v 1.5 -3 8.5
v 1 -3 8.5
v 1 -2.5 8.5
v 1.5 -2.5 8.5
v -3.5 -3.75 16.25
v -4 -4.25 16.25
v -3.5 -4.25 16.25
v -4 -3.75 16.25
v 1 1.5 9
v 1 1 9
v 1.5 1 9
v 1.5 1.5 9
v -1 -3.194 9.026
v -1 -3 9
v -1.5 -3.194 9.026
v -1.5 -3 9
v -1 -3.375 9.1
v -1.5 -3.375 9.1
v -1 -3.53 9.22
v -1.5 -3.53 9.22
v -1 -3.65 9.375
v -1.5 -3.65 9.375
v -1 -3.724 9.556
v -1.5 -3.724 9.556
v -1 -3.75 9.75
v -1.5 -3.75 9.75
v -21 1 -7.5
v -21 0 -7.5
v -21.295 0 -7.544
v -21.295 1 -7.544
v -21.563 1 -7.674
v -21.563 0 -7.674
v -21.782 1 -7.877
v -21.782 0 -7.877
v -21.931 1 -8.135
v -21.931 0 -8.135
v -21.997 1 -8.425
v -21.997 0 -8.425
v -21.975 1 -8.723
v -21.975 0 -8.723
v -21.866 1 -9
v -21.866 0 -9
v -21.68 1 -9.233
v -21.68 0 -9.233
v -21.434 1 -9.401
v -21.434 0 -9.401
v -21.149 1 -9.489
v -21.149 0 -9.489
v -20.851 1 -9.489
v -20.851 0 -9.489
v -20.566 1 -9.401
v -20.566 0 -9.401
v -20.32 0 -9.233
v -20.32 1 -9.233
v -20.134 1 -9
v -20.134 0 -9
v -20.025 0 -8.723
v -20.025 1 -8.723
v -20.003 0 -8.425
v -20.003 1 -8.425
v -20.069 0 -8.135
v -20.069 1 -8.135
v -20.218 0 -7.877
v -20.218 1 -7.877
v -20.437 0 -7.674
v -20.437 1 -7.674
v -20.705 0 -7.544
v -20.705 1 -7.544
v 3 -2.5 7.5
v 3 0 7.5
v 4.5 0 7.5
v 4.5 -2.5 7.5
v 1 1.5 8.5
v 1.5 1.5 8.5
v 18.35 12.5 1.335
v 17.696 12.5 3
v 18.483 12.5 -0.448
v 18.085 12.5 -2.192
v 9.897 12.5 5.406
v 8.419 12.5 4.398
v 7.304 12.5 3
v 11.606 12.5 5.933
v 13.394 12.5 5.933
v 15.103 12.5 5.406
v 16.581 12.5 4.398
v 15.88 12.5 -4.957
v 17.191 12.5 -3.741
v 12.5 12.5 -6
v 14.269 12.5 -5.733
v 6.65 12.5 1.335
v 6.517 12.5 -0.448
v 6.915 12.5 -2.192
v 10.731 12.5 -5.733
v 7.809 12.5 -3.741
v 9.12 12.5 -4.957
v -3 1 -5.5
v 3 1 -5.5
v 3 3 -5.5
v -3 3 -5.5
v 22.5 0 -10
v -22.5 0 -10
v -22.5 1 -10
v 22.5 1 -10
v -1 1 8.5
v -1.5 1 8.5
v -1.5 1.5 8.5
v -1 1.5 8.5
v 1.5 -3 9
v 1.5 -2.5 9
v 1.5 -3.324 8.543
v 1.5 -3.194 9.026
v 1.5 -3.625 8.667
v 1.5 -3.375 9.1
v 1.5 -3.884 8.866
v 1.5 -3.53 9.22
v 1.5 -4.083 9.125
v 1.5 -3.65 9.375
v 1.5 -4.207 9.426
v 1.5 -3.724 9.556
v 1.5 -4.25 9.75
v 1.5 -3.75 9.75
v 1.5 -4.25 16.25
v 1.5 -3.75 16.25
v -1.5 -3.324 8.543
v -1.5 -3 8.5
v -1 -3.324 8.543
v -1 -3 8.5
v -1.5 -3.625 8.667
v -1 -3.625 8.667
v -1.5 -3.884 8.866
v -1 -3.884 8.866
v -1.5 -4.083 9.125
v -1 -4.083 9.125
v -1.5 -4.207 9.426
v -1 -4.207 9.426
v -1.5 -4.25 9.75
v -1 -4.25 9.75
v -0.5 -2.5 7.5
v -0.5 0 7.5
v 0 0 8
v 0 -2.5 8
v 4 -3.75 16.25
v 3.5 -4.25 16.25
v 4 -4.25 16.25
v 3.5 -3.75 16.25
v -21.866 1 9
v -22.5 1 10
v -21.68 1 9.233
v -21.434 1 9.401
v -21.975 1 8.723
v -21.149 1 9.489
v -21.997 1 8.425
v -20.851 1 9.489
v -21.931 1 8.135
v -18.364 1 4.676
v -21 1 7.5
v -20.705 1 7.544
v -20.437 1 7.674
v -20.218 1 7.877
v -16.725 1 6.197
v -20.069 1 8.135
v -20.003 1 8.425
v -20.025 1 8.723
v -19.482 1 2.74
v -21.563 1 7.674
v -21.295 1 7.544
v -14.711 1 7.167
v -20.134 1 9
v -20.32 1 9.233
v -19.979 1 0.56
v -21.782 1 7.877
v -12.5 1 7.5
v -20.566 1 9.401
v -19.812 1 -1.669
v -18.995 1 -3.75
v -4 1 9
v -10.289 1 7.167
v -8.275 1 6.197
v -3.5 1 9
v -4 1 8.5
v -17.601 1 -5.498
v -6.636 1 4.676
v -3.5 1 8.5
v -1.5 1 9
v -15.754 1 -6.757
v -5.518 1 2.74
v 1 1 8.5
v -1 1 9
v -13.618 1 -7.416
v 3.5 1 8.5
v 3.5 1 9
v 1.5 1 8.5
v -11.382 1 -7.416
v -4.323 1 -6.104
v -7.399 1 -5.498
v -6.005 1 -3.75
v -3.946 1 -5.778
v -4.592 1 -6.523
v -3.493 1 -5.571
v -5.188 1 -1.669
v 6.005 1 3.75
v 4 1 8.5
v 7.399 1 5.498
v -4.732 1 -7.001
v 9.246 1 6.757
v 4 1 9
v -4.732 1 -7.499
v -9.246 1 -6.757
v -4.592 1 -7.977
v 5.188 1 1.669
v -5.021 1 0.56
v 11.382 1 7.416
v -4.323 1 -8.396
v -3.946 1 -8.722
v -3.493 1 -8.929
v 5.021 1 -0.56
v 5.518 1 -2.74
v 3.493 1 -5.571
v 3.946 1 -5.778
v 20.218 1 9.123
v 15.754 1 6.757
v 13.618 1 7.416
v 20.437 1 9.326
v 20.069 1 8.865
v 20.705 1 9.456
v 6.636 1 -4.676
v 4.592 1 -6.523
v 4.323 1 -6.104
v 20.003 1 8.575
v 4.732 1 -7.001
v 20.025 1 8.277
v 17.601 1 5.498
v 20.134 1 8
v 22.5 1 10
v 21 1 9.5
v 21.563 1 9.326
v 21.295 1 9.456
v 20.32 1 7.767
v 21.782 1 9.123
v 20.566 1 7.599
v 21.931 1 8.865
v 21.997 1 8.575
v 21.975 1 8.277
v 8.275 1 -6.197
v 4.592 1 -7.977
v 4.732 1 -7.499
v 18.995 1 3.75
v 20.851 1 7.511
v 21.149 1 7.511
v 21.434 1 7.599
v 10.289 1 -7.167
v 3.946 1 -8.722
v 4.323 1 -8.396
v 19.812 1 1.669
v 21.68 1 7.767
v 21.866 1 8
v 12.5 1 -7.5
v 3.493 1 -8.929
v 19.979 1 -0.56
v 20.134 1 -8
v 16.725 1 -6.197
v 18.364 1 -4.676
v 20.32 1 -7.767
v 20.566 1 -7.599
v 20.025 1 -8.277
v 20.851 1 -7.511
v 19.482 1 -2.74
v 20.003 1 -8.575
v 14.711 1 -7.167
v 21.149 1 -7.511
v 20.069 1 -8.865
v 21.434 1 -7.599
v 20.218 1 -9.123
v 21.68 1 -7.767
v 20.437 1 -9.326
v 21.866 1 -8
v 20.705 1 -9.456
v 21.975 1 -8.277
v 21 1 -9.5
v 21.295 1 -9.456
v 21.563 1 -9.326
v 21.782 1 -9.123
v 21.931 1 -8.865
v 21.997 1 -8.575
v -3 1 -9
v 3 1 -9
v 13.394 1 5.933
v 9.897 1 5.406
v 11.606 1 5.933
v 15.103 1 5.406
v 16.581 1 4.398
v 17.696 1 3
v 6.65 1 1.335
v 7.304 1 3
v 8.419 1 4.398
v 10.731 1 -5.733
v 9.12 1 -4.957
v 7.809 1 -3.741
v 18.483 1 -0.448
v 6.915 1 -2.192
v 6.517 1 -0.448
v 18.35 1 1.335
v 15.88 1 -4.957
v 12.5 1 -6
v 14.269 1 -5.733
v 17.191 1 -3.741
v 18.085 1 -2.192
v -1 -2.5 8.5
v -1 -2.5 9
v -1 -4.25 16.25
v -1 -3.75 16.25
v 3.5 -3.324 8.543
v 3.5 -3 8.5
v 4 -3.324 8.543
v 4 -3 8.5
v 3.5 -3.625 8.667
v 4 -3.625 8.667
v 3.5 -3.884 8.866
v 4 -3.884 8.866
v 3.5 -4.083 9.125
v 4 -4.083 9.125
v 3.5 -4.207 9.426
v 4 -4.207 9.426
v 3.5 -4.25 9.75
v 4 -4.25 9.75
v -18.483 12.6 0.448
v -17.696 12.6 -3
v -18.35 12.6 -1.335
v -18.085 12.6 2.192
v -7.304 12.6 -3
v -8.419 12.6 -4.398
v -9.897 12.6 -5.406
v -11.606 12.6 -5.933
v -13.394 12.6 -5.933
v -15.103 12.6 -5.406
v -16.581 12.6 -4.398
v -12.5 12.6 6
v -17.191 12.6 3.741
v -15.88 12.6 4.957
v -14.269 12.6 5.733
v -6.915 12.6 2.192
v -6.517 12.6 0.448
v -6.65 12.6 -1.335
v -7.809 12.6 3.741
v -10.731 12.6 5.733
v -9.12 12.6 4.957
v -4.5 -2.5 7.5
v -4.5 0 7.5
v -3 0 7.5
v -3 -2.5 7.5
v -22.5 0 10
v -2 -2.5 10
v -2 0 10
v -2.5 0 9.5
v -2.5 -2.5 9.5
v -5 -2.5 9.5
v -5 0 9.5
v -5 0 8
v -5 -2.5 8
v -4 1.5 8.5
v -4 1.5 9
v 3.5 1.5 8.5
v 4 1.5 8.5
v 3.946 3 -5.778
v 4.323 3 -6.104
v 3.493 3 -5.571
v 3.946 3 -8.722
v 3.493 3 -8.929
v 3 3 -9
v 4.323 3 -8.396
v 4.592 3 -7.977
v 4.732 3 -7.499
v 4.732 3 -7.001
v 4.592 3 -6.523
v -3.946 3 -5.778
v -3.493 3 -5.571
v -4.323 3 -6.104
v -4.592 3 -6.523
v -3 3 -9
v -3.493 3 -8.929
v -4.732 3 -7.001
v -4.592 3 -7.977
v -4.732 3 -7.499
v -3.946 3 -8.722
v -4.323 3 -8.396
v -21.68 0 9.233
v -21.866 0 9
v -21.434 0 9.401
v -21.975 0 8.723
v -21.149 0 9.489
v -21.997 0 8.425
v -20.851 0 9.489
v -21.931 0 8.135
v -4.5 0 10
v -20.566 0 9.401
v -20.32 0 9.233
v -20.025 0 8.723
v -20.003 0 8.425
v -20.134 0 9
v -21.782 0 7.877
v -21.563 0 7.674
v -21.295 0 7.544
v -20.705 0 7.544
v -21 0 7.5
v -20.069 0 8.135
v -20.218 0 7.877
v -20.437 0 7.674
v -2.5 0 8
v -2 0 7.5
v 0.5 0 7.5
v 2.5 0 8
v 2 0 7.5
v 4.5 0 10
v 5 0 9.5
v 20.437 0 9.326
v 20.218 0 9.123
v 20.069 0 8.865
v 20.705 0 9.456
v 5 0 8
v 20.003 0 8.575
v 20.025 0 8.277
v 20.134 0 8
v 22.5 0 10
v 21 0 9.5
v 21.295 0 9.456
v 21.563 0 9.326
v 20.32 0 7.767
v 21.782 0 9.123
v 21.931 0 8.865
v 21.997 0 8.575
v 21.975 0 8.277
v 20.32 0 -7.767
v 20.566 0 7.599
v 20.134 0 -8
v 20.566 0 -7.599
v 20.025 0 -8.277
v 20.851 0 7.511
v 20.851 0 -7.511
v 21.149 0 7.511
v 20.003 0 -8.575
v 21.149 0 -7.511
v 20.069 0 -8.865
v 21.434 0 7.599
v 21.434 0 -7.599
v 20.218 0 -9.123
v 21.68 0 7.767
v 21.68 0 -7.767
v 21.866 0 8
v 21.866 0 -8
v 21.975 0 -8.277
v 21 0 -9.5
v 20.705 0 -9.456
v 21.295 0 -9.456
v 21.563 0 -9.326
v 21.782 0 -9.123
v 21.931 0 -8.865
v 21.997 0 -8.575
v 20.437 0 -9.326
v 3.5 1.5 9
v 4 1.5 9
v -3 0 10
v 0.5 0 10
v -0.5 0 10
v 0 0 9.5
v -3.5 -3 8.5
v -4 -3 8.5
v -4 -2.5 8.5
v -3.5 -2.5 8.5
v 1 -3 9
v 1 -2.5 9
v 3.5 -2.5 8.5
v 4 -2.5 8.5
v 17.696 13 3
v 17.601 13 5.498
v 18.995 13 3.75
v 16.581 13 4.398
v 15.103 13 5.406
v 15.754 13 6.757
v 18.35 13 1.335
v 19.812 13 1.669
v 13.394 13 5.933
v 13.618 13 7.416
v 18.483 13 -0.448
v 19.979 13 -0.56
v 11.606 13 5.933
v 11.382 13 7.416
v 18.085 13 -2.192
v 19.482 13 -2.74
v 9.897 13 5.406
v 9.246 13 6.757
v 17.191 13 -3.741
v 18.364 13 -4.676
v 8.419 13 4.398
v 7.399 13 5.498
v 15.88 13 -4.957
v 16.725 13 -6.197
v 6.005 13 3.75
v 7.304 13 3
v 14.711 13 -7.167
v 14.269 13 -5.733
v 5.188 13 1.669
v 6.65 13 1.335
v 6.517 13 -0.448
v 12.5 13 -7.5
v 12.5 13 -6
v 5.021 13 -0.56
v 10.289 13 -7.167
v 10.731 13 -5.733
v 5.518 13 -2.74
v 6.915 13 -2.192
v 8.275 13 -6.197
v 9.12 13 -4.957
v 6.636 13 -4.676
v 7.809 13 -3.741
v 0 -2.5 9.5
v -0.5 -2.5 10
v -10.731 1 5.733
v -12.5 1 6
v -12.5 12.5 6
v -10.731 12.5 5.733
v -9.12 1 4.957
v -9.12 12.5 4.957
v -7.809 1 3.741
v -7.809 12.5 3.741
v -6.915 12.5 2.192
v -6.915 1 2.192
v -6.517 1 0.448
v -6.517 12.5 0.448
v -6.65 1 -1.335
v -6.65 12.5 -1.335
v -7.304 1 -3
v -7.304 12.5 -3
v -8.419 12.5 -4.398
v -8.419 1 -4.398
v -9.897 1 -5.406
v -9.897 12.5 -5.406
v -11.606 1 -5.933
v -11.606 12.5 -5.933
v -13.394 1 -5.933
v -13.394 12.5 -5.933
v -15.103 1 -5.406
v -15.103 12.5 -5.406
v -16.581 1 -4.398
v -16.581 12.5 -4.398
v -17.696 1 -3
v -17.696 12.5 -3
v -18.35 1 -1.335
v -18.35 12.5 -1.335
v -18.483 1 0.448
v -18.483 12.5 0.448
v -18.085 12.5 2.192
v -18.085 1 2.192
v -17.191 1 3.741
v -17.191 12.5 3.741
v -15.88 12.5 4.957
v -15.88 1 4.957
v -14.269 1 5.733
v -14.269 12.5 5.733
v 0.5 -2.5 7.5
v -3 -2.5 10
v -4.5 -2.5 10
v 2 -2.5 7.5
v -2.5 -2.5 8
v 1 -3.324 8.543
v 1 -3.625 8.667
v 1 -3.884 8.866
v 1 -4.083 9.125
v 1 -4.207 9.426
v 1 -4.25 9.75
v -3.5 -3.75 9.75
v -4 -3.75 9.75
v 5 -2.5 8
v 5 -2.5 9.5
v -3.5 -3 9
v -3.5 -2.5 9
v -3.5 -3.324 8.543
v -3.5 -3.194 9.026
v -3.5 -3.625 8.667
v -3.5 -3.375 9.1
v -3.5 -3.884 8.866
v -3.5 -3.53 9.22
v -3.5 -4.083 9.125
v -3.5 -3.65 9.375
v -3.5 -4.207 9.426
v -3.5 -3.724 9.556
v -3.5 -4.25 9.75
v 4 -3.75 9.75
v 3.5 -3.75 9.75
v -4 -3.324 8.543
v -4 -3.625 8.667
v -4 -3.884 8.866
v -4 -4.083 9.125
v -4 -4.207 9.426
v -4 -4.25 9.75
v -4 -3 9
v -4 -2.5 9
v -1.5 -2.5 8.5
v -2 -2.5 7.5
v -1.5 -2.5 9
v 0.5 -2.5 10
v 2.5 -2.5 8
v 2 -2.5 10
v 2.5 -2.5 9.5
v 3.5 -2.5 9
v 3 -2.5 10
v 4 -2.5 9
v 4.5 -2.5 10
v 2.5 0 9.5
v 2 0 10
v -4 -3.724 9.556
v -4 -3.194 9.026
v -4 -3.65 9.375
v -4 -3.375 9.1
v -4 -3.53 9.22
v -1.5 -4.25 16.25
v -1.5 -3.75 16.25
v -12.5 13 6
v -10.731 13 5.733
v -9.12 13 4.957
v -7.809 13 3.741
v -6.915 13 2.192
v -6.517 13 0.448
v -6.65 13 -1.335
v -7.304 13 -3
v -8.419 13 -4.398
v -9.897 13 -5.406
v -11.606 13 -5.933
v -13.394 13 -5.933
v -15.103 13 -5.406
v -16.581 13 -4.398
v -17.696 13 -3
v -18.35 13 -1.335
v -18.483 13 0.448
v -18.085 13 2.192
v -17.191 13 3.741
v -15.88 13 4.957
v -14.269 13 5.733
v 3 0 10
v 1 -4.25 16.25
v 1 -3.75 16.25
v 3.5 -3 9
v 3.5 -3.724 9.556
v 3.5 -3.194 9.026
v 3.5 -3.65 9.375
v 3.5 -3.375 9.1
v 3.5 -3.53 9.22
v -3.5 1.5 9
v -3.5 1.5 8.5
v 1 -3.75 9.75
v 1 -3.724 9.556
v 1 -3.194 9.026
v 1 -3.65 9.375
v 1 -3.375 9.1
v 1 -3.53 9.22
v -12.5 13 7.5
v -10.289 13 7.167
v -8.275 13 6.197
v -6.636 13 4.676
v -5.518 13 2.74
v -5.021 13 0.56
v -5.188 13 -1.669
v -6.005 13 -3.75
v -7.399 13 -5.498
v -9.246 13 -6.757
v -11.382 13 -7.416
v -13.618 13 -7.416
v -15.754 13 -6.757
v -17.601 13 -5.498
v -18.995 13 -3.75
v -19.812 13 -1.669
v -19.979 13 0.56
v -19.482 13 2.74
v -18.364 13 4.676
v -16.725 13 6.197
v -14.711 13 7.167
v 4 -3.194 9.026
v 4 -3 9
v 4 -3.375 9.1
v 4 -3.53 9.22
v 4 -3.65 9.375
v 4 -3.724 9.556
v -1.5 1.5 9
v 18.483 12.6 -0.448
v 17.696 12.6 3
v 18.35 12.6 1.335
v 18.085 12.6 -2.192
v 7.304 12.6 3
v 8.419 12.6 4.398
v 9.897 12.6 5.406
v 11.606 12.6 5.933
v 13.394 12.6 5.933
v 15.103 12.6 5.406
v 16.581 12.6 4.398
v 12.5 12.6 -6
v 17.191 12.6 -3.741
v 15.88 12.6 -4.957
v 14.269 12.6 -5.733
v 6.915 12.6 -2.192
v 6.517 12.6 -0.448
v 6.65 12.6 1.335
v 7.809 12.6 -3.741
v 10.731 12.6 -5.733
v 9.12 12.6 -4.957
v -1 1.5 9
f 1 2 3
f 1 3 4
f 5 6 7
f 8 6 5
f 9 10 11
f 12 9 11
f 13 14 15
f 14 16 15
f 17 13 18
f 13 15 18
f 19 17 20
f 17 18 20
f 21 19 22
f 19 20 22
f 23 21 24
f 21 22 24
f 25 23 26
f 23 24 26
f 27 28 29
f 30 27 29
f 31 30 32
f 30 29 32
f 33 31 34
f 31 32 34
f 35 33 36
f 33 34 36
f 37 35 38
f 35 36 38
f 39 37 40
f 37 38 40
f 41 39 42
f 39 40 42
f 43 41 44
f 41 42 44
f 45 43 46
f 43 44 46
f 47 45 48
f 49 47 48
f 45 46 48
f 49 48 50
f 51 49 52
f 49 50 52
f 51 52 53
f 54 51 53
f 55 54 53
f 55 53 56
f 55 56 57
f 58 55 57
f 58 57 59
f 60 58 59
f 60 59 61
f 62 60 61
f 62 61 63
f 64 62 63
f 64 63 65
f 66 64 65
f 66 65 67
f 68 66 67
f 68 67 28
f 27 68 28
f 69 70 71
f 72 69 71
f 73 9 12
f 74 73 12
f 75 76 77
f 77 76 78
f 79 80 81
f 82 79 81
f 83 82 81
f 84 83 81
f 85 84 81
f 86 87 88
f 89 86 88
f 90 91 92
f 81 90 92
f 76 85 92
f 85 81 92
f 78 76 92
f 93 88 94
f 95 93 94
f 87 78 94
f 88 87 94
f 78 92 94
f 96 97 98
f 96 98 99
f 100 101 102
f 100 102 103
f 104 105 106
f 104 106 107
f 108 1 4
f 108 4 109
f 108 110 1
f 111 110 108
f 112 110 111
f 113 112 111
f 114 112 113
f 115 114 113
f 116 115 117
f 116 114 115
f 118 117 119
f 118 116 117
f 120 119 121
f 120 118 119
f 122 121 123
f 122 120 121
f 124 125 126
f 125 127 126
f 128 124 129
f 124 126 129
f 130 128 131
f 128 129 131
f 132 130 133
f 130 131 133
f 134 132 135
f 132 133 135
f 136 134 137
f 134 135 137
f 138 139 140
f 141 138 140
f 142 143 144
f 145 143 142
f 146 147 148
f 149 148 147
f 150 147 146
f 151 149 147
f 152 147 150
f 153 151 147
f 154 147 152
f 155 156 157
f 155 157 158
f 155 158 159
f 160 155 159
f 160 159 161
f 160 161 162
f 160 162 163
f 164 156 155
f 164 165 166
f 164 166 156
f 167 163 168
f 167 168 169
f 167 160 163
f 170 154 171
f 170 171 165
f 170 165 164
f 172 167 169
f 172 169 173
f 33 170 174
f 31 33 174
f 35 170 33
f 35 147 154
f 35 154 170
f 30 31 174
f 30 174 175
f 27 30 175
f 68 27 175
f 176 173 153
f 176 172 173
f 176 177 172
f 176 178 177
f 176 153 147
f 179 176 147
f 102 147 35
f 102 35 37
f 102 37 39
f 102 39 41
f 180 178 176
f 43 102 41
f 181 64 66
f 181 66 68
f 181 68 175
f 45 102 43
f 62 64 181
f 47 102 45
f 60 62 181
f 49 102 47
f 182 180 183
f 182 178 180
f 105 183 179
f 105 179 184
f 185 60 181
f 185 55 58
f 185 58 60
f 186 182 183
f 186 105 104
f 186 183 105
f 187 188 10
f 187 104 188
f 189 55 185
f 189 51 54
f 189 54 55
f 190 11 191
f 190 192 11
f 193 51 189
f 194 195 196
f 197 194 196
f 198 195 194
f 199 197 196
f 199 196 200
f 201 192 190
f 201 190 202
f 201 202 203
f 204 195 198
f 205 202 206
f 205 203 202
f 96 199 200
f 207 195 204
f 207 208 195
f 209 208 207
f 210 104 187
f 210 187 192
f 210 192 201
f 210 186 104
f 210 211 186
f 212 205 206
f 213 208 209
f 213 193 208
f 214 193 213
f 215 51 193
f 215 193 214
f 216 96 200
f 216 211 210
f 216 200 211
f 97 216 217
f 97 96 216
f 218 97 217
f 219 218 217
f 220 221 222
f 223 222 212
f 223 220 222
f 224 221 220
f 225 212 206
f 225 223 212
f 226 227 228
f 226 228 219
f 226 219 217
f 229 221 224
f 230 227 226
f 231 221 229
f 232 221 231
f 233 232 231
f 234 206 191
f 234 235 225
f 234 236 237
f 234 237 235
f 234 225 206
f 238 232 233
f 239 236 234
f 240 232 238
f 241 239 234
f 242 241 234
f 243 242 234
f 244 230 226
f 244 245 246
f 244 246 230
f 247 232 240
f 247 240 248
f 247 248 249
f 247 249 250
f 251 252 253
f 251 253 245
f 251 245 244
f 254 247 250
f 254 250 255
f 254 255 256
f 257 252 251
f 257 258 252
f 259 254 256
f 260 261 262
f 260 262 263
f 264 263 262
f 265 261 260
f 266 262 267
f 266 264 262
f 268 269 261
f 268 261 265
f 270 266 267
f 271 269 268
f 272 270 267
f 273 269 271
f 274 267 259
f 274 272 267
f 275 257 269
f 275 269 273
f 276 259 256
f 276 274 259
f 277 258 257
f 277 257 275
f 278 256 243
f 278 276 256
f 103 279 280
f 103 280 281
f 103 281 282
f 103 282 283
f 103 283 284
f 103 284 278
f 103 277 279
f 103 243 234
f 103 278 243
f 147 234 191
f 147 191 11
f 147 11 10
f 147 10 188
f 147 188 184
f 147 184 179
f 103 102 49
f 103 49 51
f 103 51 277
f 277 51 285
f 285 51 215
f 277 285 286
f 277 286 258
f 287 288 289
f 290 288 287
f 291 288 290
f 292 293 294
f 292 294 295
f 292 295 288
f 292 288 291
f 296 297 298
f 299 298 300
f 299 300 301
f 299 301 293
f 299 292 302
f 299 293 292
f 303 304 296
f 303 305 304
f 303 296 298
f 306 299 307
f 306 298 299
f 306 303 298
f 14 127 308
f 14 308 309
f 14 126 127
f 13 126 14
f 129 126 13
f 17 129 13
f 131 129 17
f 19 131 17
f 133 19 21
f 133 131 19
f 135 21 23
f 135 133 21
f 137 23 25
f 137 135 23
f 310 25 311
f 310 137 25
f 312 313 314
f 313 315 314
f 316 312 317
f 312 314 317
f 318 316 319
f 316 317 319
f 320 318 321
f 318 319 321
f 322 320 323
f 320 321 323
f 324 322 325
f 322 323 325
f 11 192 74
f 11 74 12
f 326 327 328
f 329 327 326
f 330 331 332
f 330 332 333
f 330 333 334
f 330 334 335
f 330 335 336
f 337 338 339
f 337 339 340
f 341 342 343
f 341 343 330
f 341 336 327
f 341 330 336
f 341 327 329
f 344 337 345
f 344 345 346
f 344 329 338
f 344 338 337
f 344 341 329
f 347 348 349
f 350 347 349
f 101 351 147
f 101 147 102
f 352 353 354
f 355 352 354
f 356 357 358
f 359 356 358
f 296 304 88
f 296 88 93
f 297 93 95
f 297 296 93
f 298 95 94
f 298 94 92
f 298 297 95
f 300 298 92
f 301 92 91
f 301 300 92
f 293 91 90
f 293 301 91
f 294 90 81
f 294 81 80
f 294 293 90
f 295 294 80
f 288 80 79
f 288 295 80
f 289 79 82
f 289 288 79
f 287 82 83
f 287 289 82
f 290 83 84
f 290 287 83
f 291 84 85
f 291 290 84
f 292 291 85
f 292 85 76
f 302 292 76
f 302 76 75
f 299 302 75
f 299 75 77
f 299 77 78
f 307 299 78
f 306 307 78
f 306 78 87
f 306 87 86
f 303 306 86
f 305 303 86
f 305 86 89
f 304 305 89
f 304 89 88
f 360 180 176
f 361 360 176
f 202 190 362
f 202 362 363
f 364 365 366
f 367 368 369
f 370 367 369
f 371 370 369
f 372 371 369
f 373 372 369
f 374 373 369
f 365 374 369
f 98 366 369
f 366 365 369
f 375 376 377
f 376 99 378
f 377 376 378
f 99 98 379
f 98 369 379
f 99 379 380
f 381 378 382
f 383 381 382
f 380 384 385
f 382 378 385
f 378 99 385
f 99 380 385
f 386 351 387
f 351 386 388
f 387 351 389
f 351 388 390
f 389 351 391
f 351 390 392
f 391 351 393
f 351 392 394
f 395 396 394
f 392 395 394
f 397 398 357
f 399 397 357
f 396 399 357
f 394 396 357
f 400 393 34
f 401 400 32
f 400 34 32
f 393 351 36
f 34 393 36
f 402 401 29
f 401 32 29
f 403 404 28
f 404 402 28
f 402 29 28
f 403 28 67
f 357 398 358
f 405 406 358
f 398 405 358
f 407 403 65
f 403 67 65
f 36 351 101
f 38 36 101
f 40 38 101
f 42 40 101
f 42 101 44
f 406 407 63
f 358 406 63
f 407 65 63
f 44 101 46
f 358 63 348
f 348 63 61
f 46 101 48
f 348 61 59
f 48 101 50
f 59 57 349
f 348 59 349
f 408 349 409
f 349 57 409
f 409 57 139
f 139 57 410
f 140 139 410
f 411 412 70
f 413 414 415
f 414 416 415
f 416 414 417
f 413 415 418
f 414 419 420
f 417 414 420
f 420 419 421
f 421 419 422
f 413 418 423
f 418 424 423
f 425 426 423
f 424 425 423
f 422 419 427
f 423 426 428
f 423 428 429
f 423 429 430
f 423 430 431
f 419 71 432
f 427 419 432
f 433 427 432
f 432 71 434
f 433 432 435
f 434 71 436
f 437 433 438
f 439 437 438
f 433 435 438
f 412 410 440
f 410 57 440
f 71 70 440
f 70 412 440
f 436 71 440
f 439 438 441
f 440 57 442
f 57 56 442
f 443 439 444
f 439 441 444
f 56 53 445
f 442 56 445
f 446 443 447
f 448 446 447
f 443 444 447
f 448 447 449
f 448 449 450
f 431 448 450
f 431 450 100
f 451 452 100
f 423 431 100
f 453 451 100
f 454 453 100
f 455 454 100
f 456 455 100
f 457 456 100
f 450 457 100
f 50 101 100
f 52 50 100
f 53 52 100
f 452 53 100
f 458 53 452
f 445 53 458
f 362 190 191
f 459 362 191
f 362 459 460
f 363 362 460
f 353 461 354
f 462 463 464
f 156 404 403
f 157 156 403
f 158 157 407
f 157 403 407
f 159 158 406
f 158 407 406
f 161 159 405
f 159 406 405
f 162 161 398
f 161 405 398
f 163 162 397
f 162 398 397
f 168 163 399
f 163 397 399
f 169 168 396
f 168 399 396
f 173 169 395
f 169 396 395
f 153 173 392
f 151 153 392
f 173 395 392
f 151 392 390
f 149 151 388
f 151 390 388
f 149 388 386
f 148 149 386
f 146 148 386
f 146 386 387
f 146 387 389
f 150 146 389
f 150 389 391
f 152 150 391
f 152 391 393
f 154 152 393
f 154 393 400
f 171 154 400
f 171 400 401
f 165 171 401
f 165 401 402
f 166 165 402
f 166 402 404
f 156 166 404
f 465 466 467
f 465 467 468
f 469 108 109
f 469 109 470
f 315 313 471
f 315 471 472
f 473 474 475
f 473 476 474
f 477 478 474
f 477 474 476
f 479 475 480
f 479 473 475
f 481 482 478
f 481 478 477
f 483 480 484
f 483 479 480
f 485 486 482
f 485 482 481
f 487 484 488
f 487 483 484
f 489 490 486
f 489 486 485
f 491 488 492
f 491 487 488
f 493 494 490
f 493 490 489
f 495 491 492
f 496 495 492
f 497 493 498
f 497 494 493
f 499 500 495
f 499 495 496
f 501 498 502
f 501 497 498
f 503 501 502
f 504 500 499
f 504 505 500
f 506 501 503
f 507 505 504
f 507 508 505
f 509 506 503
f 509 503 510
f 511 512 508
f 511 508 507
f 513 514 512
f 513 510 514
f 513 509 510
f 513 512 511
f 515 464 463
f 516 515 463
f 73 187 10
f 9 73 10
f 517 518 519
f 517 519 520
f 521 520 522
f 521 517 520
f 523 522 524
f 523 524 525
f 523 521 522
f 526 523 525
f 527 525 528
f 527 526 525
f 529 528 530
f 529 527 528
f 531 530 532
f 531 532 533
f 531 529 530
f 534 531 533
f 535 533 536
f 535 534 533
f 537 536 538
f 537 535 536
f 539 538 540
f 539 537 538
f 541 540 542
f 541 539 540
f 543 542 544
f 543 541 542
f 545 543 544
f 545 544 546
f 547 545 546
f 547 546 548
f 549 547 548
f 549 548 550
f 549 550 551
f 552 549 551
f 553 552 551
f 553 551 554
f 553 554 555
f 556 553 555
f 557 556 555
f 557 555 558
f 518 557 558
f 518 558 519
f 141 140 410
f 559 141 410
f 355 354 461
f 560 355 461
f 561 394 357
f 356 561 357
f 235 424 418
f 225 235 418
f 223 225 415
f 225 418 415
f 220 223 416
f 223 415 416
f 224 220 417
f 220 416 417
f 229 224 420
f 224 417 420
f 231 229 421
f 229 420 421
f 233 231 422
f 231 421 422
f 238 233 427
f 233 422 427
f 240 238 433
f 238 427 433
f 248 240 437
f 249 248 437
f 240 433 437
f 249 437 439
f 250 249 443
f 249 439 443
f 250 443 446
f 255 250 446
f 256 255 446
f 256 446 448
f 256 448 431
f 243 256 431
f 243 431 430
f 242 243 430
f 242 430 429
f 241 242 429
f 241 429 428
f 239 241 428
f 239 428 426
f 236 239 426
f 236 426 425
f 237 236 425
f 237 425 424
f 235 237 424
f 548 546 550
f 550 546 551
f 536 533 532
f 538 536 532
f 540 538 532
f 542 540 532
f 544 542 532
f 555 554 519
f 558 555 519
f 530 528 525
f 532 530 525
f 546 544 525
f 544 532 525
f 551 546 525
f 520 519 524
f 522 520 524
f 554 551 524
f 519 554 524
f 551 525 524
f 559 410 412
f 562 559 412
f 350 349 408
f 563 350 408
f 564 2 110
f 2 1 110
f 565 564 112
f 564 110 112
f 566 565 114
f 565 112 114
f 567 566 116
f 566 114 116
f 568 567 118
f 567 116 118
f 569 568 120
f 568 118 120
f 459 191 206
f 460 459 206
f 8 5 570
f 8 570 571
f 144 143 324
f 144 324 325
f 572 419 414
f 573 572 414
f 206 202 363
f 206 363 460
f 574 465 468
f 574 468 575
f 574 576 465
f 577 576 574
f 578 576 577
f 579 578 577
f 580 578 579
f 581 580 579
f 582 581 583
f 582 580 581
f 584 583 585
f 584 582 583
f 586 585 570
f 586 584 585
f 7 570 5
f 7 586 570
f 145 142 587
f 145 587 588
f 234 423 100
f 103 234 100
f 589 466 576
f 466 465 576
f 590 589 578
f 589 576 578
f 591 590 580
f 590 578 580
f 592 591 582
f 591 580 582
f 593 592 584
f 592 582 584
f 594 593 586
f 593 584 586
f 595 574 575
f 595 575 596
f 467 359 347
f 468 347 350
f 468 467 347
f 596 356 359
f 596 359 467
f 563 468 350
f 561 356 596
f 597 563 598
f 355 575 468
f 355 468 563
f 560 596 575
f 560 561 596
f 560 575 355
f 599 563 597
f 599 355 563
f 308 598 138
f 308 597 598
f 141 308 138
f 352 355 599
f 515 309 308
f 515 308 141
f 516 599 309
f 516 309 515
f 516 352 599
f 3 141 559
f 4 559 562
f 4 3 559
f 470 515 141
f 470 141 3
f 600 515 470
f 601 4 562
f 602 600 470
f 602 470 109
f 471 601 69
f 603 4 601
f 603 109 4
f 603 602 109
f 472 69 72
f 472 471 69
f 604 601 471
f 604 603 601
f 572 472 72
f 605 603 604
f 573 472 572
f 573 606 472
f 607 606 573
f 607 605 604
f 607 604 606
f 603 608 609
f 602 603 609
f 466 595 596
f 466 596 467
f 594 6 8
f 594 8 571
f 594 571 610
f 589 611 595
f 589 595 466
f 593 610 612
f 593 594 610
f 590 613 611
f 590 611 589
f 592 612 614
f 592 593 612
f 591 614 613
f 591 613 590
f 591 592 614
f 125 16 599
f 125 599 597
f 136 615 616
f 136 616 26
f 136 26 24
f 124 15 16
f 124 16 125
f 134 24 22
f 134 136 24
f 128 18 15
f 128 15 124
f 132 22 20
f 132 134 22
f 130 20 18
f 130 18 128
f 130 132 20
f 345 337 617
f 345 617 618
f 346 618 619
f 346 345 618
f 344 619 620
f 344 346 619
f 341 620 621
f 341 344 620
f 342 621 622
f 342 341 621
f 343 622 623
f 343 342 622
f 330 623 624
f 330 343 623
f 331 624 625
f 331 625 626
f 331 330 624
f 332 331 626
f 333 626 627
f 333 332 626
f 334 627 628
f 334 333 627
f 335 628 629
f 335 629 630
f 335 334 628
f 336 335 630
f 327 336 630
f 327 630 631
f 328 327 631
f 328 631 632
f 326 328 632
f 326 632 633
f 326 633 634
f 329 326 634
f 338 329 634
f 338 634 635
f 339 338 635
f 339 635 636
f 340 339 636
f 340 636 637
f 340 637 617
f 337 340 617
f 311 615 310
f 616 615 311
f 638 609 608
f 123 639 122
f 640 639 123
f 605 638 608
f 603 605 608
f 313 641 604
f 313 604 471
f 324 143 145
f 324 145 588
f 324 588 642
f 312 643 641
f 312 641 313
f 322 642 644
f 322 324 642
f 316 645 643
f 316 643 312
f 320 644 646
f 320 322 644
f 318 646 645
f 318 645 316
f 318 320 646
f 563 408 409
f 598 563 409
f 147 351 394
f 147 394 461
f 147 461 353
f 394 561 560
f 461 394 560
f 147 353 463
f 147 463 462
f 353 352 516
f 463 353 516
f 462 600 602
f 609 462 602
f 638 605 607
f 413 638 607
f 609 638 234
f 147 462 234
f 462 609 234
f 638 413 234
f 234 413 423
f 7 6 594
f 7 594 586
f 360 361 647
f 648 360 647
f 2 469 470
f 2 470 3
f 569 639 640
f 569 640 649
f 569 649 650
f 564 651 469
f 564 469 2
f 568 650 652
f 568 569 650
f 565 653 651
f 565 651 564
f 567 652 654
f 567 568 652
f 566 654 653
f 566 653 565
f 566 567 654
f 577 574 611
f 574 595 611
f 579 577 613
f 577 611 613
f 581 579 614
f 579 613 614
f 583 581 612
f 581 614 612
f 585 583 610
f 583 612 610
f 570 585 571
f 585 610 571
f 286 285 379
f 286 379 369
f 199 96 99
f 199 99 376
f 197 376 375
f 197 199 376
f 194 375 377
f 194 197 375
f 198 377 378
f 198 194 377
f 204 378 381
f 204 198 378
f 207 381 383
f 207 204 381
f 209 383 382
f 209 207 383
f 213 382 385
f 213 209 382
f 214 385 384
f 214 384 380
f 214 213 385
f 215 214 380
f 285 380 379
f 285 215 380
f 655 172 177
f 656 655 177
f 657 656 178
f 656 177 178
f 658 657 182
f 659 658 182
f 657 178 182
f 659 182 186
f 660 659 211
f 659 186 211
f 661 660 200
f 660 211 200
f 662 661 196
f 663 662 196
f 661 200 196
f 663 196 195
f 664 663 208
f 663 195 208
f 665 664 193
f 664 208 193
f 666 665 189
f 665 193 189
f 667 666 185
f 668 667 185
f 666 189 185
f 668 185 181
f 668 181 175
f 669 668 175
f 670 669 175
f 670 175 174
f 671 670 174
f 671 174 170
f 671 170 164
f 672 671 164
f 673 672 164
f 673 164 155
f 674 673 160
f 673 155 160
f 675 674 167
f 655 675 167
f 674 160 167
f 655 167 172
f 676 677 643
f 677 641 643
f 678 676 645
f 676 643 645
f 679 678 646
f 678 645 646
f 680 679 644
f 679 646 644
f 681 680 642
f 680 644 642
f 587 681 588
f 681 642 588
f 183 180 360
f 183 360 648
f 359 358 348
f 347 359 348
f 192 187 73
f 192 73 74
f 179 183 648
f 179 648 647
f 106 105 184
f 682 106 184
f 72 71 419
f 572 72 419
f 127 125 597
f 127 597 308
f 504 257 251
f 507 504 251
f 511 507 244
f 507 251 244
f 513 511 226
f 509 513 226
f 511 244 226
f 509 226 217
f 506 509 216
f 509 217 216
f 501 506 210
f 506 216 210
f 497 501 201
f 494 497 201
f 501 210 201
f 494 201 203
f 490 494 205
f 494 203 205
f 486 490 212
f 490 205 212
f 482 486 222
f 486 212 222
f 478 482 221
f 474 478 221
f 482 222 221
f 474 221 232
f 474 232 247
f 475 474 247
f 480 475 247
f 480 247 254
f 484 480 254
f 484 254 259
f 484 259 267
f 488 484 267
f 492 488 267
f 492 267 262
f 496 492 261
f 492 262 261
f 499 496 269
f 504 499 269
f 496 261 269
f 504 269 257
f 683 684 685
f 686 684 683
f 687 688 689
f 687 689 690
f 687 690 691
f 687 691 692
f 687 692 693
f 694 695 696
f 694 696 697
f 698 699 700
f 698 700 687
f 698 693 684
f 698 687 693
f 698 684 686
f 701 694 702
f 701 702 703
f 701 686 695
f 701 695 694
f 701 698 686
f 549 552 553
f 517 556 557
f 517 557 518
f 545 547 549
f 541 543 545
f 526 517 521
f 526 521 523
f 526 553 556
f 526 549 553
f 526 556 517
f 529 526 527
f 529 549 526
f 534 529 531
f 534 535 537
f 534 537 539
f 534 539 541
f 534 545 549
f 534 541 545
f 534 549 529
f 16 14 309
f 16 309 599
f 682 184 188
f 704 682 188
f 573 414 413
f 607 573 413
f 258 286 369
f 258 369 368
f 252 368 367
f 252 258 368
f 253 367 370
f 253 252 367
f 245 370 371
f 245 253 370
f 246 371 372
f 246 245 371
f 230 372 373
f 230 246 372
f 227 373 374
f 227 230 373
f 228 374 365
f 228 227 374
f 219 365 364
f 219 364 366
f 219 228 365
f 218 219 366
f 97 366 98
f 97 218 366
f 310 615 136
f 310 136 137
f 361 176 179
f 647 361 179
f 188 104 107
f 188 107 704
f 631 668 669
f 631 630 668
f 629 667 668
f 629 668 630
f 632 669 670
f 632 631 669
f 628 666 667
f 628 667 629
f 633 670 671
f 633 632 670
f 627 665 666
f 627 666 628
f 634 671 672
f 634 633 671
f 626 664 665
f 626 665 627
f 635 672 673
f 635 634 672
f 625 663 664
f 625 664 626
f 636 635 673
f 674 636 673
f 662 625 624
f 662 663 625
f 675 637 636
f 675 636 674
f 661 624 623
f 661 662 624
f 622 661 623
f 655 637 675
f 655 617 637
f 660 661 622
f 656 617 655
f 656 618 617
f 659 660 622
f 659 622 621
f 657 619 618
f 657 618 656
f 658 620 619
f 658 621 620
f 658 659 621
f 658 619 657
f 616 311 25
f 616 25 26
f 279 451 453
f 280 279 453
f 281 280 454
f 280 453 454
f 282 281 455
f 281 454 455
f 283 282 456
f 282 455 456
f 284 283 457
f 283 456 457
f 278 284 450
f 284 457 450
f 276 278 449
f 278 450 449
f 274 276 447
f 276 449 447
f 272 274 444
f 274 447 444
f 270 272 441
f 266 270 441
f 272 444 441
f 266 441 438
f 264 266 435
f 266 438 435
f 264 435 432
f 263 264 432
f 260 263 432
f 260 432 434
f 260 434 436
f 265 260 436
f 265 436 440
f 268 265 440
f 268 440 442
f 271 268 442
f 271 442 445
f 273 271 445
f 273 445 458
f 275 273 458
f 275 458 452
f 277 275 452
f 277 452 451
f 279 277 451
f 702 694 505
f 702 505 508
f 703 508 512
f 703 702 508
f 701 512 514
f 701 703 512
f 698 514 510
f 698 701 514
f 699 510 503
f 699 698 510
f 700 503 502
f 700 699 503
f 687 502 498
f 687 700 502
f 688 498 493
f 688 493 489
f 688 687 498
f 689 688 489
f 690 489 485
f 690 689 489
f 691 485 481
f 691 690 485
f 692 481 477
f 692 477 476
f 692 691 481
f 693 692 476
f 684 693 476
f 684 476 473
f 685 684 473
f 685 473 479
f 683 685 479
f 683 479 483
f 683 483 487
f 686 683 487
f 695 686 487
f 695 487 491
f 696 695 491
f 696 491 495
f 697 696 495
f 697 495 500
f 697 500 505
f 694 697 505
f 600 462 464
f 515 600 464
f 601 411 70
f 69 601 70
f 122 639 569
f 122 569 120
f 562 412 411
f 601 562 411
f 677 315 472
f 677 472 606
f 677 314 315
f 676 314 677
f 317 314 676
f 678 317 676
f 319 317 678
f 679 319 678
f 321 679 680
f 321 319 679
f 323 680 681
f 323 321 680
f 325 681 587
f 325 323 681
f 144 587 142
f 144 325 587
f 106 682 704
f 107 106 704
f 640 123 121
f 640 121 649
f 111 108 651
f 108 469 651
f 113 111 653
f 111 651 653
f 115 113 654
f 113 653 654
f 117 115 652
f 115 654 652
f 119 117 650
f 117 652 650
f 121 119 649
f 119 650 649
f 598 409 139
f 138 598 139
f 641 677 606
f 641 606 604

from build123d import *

# Parameters (mm, degrees)
SKETCH1_W           = 45
SKETCH1_H           = 20
BOSS_EXTRUDE1_DEPTH = 1
SKETCH2_R           = 7.5
SKETCH2_R_2         = 6
BOSS_EXTRUDE2_DEPTH = 12
BOSS_EXTRUDE3_DEPTH = 2
BOSS_EXTRUDE4_START = -0.5
SKETCH4_R           = 6
BOSS_EXTRUDE4_DEPTH = 0.1
SKETCH9_W           = 0.5
SKETCH9_H           = 0.5
SKETCH9_2_W         = 0.5
SKETCH9_2_H         = 0.5
BOSS_EXTRUDE7_DEPTH = 1.5
LPATTERN5_COUNT     = 4
LPATTERN5_PITCH     = 2.5
BOSS_EXTRUDE6_DEPTH = 2.5
SKETCH12_R          = 1
CUT_EXTRUDE4_DEPTH  = 1.5


with BuildPart() as part:
    # Sketch1 → Boss-Extrude1 (new body)
    with BuildSketch(Plane(origin=(0, 0, 0), x_dir=(1, 0, 0), z_dir=(0, 1, 0))):
        Rectangle(SKETCH1_W, SKETCH1_H)
    extrude(amount=BOSS_EXTRUDE1_DEPTH)

    # Sketch2 → Boss-Extrude2 (add)
    # profile 1 of 2: a face of its own
    with BuildSketch(Plane(origin=(0, 1, 0), x_dir=(1, 0, 0), z_dir=(0, 1, 0))):
        with Locations(Location((-12.5, 0, 0), (0, 0, 270))):
            Circle(SKETCH2_R)
        with Locations(Location((-12.5, 0, 0), (0, 0, 270))):
            Circle(SKETCH2_R_2, mode=Mode.SUBTRACT)
    # profile 2 of 2: a face of its own
    with BuildSketch(Plane(origin=(0, 1, 0), x_dir=(1, 0, 0), z_dir=(0, 1, 0))):
        with Locations(Location((12.5, 0, 0), (0, 0, 90))):
            Circle(SKETCH2_R)
        with Locations(Location((12.5, 0, 0), (0, 0, 90))):
            Circle(SKETCH2_R_2, mode=Mode.SUBTRACT)
    extrude(amount=BOSS_EXTRUDE2_DEPTH)

    # Sketch3 → Boss-Extrude3 (add)
    with BuildSketch(Plane(origin=(0, 1, 0), x_dir=(1, 0, 0), z_dir=(0, 1, 0))):
        with BuildLine():
            Line((-3, 9), (3, 9))
            ThreePointArc((3, 9), (4.75, 7.25), (3, 5.5))
            Line((3, 5.5), (-3, 5.5))
            ThreePointArc((-3, 5.5), (-4.75, 7.25), (-3, 9))
        make_face()
    extrude(amount=BOSS_EXTRUDE3_DEPTH)

    # Sketch4 → Boss-Extrude4 (add)
    with BuildSketch(Plane(origin=(0, 13, 0), x_dir=(1, 0, 0), z_dir=(0, 1, 0)).offset(BOSS_EXTRUDE4_START)):
        with Locations(Location((-12.5, 0, 0), (0, 0, 270))):
            Circle(SKETCH4_R)
        with Locations(Location((12.5, 0, 0), (0, 0, 90))):
            Circle(SKETCH4_R)
    extrude(amount=BOSS_EXTRUDE4_DEPTH)

    # Sweep1: sweep along a path in Sketch8
    with BuildLine(Plane(origin=(3.75, 0, 0), x_dir=(0, 0, -1), z_dir=(1, 0, 0))) as sweep1_path:
        Line((-8.75, 0), (-8.75, -3))
        ThreePointArc((-8.75, -3), (-9.042893219, -3.707106781), (-9.75, -4))
        Line((-9.75, -4), (-16.25, -4))
    # Sketch9 → Sweep1 (sweep)
    with BuildSketch(Plane.XZ):
        with Locations((3.75, 8.75)):
            Rectangle(SKETCH9_W, SKETCH9_H)
    sweep1 = sweep(path=sweep1_path.line)

    # Sketch9<2> → Boss-Extrude7 (add)
    with BuildSketch(Plane.XZ):
        with Locations((3.75, 8.75)):
            Rectangle(SKETCH9_2_W, SKETCH9_2_H)
    boss_extrude7 = extrude(amount=-BOSS_EXTRUDE7_DEPTH)

    # LPattern5: Sweep1, Boss-Extrude7 ×4
    with Locations(*[(-i * LPATTERN5_PITCH, 0, 0) for i in range(1, LPATTERN5_COUNT)]):
        add(sweep1)
        add(boss_extrude7)

    # Sketch11 → Boss-Extrude6 (add)
    with BuildSketch(Plane.XZ):
        Polygon((3, 7.5), (4.5, 7.5), (5, 8), (5, 9.5), (4.5, 10), (3, 10), (2.5, 9.5), (2, 10), (0.5, 10), (0, 9.5), (-0.5, 10), (-2, 10), (-2.5, 9.5), (-3, 10), (-4.5, 10), (-5, 9.5), (-5, 8), (-4.5, 7.5), (-3, 7.5), (-2.5, 8), (-2, 7.5), (-0.5, 7.5), (0, 8), (0.5, 7.5), (2, 7.5), (2.5, 8), align=None)
    extrude(amount=BOSS_EXTRUDE6_DEPTH)

    # Sketch12 → Cut-Extrude4 (cut)
    with BuildSketch(Plane.XZ):
        with Locations(Location((-21, 8.5, 0), (0, 0, 270))):
            Circle(SKETCH12_R)
        with Locations(Location((-21, -8.5, 0), (0, 0, 90))):
            Circle(SKETCH12_R)
        with Locations(Location((21, -8.5, 0), (0, 0, 270))):
            Circle(SKETCH12_R)
        with Locations(Location((21, 8.5, 0), (0, 0, 90))):
            Circle(SKETCH12_R)
    extrude(amount=-CUT_EXTRUDE4_DEPTH, mode=Mode.SUBTRACT)


solid = part.part
